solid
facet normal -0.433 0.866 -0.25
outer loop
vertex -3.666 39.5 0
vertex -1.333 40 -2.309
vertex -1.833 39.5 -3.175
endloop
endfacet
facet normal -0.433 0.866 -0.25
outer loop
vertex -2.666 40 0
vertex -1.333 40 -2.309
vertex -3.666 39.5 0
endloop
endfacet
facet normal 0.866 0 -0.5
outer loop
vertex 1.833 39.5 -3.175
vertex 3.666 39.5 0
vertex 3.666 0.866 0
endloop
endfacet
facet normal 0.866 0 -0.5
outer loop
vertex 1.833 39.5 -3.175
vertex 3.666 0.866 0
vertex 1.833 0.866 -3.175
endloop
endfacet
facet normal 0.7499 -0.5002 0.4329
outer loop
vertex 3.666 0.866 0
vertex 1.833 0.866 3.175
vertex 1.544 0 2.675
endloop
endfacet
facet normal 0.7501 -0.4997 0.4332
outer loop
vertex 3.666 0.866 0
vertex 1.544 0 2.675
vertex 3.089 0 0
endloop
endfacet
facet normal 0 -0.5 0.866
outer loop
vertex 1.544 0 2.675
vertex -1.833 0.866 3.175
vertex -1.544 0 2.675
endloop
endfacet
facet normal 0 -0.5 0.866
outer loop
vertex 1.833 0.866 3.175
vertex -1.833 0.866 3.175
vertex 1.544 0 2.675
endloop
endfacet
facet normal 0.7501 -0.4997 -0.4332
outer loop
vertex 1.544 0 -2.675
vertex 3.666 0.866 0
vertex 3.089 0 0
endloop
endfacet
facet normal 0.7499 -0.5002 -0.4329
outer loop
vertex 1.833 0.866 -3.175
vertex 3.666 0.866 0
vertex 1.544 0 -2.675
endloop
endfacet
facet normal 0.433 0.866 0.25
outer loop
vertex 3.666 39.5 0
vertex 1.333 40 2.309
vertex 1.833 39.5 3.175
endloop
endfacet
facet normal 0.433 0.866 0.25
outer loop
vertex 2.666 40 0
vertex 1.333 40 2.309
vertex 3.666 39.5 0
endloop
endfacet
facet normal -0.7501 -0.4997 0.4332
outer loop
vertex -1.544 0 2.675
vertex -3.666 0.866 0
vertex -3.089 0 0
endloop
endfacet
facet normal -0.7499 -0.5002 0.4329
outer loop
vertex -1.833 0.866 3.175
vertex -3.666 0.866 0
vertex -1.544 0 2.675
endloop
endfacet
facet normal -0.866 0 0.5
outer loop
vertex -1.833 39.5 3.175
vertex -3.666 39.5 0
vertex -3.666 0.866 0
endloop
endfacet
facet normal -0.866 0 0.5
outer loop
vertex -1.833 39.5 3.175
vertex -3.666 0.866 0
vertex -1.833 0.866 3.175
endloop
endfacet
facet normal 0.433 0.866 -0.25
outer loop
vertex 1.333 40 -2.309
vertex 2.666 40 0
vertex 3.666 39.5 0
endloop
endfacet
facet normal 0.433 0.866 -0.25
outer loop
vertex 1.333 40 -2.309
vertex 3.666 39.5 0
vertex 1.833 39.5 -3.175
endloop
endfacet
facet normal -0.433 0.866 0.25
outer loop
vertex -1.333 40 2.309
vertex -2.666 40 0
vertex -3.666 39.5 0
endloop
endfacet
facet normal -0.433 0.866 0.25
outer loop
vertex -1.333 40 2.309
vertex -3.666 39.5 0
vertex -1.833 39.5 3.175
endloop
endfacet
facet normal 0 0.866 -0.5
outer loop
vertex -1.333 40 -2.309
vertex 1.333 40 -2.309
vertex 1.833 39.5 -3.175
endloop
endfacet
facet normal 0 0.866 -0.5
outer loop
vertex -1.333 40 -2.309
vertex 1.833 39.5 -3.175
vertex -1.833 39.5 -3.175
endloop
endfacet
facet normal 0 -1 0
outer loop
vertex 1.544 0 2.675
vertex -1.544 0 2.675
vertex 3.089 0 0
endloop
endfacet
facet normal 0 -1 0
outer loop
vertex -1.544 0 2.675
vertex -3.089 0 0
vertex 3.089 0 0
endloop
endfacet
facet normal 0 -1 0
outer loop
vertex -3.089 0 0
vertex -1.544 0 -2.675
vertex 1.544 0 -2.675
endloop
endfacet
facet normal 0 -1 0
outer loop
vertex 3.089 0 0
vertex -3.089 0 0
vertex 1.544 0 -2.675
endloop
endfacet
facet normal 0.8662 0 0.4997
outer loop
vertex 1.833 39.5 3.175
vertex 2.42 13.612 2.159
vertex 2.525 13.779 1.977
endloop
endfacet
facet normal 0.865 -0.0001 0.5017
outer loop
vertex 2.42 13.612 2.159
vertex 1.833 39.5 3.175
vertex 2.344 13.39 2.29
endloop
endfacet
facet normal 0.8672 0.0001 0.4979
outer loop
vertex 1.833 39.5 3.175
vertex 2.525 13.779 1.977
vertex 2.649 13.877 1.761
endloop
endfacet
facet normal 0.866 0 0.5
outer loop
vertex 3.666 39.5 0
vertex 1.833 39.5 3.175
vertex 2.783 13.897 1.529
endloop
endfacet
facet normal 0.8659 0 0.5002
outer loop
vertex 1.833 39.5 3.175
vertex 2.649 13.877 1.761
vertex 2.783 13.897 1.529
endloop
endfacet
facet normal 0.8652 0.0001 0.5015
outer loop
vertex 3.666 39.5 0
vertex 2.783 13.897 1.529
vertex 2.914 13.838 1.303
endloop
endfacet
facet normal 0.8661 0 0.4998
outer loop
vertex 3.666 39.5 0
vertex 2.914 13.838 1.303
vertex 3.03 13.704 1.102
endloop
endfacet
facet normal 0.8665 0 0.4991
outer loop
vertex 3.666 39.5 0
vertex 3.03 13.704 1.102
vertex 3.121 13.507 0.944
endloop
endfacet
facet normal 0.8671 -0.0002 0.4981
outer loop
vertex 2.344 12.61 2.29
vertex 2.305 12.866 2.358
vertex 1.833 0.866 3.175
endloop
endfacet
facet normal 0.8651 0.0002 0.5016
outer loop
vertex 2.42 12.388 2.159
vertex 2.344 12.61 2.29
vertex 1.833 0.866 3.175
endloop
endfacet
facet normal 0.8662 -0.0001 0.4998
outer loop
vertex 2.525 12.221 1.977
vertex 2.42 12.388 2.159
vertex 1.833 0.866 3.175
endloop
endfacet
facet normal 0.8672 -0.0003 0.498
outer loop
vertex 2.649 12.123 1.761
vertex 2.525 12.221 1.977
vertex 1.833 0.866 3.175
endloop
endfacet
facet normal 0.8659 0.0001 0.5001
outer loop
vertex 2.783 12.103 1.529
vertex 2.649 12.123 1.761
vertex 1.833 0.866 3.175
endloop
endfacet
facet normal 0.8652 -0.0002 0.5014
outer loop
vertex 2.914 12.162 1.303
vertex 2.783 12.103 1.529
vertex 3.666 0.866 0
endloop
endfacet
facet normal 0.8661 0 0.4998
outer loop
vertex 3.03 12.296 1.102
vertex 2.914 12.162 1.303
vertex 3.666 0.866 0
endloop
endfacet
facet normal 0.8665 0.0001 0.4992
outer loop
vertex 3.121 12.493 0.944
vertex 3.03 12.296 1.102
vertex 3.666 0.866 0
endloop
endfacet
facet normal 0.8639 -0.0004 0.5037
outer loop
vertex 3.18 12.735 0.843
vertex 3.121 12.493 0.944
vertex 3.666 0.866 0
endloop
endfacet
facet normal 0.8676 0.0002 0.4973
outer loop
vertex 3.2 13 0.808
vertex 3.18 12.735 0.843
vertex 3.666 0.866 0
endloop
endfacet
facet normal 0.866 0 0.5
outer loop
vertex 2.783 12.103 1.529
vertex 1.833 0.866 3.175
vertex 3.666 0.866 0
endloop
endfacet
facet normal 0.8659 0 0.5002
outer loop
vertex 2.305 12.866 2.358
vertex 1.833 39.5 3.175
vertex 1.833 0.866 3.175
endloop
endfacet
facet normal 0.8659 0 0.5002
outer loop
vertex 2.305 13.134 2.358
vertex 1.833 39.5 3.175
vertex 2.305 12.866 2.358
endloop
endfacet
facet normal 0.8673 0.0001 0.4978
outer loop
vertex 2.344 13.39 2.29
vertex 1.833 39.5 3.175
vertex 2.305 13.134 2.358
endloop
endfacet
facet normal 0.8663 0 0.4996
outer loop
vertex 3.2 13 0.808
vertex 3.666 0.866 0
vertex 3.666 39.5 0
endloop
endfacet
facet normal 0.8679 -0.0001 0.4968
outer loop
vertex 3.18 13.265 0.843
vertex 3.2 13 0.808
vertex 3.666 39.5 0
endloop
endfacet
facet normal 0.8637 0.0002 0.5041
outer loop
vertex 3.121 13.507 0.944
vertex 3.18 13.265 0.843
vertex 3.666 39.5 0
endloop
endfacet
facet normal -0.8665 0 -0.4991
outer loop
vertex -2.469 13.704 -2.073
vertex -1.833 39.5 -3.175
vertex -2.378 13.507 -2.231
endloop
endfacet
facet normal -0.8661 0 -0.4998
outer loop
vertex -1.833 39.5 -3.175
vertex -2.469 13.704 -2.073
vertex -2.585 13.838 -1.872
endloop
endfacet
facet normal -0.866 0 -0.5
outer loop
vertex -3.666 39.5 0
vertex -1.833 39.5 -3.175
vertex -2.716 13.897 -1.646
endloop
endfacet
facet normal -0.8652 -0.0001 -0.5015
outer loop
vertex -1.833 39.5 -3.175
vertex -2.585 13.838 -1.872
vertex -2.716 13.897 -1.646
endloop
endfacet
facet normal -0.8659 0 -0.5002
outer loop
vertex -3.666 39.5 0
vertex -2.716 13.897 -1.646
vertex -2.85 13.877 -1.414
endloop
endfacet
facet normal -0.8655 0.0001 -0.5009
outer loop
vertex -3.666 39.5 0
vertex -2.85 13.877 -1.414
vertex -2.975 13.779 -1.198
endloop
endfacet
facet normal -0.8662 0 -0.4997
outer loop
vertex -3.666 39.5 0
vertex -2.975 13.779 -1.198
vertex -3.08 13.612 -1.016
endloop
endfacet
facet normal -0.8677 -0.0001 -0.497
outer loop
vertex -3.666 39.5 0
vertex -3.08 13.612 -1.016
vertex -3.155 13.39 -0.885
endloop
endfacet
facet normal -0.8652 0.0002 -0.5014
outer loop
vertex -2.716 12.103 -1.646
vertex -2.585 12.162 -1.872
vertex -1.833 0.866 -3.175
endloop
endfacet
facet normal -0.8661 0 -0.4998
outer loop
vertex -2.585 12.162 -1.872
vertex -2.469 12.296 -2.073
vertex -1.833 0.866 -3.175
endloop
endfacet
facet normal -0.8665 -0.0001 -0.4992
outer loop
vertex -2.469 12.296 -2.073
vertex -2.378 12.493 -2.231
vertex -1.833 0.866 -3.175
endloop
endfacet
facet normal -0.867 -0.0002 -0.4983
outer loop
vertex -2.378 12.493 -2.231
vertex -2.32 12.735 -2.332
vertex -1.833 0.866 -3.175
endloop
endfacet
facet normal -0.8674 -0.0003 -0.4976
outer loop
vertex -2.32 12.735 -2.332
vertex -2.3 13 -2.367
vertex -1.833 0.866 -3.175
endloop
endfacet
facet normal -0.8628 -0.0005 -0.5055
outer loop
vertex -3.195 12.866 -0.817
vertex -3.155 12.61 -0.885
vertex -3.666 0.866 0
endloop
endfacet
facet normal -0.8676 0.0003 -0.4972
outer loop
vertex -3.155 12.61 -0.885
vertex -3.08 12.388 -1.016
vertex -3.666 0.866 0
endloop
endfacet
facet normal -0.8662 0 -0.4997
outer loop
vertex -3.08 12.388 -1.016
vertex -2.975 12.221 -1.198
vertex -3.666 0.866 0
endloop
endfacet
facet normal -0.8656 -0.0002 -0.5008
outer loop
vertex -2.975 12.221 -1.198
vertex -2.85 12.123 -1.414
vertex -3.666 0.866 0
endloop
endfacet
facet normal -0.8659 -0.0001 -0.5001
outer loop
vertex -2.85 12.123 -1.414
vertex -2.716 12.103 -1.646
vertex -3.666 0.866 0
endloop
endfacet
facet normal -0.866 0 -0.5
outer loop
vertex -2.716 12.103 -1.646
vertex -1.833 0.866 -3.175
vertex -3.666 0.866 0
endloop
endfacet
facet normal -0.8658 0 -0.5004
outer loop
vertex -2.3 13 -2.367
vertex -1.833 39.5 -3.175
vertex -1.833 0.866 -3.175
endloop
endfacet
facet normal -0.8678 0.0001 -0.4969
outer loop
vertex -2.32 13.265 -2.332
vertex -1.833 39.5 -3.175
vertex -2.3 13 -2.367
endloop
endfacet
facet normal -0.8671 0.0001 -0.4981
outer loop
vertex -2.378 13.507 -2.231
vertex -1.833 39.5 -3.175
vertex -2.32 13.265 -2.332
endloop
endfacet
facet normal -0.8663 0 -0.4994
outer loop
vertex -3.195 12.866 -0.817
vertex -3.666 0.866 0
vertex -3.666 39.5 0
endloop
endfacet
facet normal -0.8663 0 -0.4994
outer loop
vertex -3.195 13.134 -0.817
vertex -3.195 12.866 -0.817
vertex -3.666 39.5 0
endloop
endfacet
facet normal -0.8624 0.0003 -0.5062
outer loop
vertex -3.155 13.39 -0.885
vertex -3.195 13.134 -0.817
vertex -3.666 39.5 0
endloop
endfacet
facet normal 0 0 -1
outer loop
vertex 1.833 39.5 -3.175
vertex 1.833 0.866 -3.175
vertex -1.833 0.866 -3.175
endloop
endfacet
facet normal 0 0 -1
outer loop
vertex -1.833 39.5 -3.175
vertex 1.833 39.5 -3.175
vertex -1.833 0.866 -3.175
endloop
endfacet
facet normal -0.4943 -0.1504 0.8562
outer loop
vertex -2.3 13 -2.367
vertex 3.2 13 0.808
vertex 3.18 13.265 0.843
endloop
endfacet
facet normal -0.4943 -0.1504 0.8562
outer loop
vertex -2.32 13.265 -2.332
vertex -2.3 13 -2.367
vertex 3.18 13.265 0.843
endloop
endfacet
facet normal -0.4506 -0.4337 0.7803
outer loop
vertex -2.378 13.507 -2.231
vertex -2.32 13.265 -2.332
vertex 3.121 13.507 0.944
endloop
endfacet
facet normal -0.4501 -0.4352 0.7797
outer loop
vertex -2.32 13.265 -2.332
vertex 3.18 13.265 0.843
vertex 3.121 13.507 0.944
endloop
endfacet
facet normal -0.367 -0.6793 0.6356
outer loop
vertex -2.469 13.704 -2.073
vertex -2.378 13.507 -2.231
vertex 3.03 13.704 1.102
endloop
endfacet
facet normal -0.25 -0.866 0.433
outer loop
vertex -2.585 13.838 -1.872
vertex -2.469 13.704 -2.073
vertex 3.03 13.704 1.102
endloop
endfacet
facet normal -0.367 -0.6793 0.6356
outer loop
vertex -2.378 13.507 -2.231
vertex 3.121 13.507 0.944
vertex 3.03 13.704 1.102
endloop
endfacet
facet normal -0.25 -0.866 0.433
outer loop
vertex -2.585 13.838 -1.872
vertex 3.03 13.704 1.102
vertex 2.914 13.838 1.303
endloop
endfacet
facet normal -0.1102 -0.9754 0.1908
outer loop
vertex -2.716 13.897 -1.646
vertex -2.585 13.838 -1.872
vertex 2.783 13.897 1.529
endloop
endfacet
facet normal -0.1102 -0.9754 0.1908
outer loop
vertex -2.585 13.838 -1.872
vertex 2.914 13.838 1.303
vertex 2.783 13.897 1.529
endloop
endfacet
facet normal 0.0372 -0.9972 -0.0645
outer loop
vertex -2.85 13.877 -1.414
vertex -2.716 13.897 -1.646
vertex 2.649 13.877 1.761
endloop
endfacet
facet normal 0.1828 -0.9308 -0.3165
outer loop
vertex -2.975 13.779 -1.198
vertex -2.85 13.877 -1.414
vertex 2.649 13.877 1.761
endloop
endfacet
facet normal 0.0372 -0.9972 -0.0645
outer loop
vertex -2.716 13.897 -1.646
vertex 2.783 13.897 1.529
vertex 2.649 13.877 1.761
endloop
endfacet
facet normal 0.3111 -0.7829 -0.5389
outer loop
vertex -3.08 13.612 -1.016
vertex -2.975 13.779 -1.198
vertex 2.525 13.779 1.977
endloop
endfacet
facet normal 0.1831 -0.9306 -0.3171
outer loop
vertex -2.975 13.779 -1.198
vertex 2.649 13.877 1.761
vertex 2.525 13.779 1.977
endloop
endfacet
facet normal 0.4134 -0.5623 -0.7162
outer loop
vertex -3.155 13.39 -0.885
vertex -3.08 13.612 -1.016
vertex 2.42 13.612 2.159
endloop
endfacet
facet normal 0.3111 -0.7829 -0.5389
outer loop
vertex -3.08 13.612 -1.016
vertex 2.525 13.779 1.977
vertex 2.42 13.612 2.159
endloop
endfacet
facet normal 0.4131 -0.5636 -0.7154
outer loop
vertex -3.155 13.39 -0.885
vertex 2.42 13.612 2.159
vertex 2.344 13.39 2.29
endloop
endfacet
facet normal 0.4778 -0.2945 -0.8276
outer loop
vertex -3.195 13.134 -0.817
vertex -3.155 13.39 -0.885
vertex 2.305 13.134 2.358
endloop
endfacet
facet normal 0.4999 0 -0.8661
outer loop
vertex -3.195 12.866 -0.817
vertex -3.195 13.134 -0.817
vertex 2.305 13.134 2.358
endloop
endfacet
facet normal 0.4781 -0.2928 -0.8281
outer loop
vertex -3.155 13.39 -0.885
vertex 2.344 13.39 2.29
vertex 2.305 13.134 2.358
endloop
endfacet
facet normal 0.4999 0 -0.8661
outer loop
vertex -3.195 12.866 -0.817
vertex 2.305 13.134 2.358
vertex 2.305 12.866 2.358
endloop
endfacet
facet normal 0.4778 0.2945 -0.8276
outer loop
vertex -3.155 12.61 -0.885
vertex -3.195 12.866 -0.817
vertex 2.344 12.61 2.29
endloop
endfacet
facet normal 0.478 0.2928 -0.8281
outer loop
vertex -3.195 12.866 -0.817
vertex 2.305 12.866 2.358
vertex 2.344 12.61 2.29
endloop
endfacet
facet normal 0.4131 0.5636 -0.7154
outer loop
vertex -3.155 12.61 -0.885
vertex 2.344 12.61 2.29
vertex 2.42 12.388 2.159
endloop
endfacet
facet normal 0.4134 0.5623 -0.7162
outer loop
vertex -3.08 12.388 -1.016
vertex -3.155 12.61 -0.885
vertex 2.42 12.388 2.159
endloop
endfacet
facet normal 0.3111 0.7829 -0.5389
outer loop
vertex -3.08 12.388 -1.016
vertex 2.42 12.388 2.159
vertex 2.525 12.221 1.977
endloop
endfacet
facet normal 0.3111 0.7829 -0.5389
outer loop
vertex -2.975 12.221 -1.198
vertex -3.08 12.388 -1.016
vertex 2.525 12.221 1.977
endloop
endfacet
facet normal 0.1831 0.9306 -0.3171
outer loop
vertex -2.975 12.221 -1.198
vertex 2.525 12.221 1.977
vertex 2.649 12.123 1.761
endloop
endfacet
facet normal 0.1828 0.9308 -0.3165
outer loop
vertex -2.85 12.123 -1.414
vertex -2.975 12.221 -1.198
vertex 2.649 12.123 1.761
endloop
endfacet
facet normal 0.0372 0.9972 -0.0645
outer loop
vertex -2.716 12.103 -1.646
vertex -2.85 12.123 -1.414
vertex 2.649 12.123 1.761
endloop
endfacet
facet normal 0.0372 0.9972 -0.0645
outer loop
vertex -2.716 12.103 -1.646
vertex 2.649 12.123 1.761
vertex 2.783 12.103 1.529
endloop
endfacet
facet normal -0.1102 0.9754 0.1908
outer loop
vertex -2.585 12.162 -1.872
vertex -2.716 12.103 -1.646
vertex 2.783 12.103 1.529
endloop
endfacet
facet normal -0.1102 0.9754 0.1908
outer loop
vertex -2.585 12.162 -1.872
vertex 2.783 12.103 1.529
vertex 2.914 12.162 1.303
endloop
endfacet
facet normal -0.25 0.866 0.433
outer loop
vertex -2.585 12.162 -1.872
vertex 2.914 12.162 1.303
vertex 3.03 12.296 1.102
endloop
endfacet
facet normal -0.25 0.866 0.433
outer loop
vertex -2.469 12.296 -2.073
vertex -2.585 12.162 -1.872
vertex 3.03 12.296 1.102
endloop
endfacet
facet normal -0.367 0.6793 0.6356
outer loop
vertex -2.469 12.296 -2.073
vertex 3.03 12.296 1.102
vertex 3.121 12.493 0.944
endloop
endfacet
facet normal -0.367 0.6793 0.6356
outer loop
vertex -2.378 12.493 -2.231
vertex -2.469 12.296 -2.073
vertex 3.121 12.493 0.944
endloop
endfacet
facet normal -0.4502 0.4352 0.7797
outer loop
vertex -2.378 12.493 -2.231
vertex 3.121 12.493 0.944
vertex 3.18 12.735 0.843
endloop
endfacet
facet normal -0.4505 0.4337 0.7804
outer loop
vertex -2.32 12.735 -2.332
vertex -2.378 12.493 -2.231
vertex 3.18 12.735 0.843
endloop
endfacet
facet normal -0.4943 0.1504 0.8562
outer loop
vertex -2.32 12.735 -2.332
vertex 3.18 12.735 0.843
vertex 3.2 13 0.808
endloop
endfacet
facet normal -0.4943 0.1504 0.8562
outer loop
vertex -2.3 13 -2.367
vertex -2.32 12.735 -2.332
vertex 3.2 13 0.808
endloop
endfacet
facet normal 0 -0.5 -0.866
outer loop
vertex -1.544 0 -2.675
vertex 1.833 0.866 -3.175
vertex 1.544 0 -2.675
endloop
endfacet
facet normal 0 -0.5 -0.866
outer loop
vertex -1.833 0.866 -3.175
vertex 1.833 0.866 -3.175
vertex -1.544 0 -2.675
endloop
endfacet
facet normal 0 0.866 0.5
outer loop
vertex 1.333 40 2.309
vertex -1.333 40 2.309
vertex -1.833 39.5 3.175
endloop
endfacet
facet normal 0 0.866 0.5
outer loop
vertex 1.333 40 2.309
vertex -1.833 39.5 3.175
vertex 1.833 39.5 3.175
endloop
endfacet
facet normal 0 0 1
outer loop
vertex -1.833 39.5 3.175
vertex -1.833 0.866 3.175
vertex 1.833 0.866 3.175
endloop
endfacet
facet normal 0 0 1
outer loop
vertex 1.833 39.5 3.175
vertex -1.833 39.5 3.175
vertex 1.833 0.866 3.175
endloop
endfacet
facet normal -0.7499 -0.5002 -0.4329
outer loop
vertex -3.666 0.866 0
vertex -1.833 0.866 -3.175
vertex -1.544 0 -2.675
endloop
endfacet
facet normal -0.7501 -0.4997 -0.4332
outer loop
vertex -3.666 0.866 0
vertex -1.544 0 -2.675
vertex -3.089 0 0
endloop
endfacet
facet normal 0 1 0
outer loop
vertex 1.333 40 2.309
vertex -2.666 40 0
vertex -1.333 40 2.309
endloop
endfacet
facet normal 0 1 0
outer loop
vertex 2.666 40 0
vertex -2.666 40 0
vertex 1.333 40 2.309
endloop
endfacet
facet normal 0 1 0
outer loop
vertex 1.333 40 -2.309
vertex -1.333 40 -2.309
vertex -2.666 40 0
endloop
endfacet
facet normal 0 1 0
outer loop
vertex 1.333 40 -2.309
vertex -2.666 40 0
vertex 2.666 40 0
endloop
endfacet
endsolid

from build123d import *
from OCP.BRepFilletAPI import BRepFilletAPI_MakeChamfer

# Parameters (mm, degrees)
P_IDAT_VYSUNUT_M1_DEPTH  = 40
ZKOSEN_1_SIZE            = 0.5
ZKOSEN_1_SIZE2           = 0.866025404
SKICA2_R                 = 0.9
ODEBRAT_VYSUNUT_M1_DEPTH = 41.790243421


with BuildPart() as part:
    # Skica1 → Přidat vysunutím1 (new body)
    with BuildSketch(Plane(origin=(0, 0, 0), x_dir=(1, 0, 0), z_dir=(0, 1, 0))):
        Polygon((3.666174209, 0), (1.833087105, 3.175), (-1.833087105, 3.175), (-3.666174209, 0), (-1.833087105, -3.175), (1.833087105, -3.175), align=None)
    extrude(amount=P_IDAT_VYSUNUT_M1_DEPTH)

    # Zkosení1: one chamfer whose edges measure the first distance from different faces: ONE call of the kernel's chamfer builder (chamfer() names one face for all edges)
    zkosen_1_edges_1 = [part.edges().sort_by_distance(p)[0] for p in [
        (0, 40, -3.175),
    ]]
    zkosen_1_side_1 = [part.faces().sort_by_distance(p)[0] for p in [
        (0, 20, -3.175),
    ]]
    zkosen_1_edges_2 = [part.edges().sort_by_distance(p)[0] for p in [
        (-2.749630657, 40, -1.5875),
    ]]
    zkosen_1_side_2 = [part.faces().sort_by_distance(p)[0] for p in [
        (-2.749630657, 20, -1.5875),
    ]]
    zkosen_1_edges_3 = [part.edges().sort_by_distance(p)[0] for p in [
        (-2.749630657, 40, 1.5875),
    ]]
    zkosen_1_side_3 = [part.faces().sort_by_distance(p)[0] for p in [
        (-2.749630657, 20, 1.5875),
    ]]
    zkosen_1_edges_4 = [part.edges().sort_by_distance(p)[0] for p in [
        (0, 40, 3.175),
    ]]
    zkosen_1_side_4 = [part.faces().sort_by_distance(p)[0] for p in [
        (0, 20, 3.175),
    ]]
    zkosen_1_edges_5 = [part.edges().sort_by_distance(p)[0] for p in [
        (2.749630657, 40, 1.5875),
    ]]
    zkosen_1_side_5 = [part.faces().sort_by_distance(p)[0] for p in [
        (2.749630657, 20, 1.5875),
    ]]
    zkosen_1_edges_6 = [part.edges().sort_by_distance(p)[0] for p in [
        (0, 0, 3.175),
        (-2.749630657, 0, 1.5875),
        (-2.749630657, 0, -1.5875),
        (0, 0, -3.175),
        (2.749630657, 0, -1.5875),
        (2.749630657, 0, 1.5875),
    ]]
    zkosen_1_side_6 = [part.faces().sort_by_distance(p)[0] for p in [
        (0, 0, 0),
    ]]
    zkosen_1_edges_7 = [part.edges().sort_by_distance(p)[0] for p in [
        (2.749630657, 40, -1.5875),
    ]]
    zkosen_1_side_7 = [part.faces().sort_by_distance(p)[0] for p in [
        (2.749630657, 20, -1.5875),
    ]]
    zkosen_1 = BRepFilletAPI_MakeChamfer(part.part.solid().wrapped)
    for e in zkosen_1_edges_1:
        zkosen_1.Add(ZKOSEN_1_SIZE, ZKOSEN_1_SIZE2, e.wrapped, zkosen_1_side_1[0].wrapped)  # the first distance lies on this face
    for e in zkosen_1_edges_2:
        zkosen_1.Add(ZKOSEN_1_SIZE, ZKOSEN_1_SIZE2, e.wrapped, zkosen_1_side_2[0].wrapped)  # the first distance lies on this face
    for e in zkosen_1_edges_3:
        zkosen_1.Add(ZKOSEN_1_SIZE, ZKOSEN_1_SIZE2, e.wrapped, zkosen_1_side_3[0].wrapped)  # the first distance lies on this face
    for e in zkosen_1_edges_4:
        zkosen_1.Add(ZKOSEN_1_SIZE, ZKOSEN_1_SIZE2, e.wrapped, zkosen_1_side_4[0].wrapped)  # the first distance lies on this face
    for e in zkosen_1_edges_5:
        zkosen_1.Add(ZKOSEN_1_SIZE, ZKOSEN_1_SIZE2, e.wrapped, zkosen_1_side_5[0].wrapped)  # the first distance lies on this face
    for e in zkosen_1_edges_6:
        zkosen_1.Add(ZKOSEN_1_SIZE, ZKOSEN_1_SIZE2, e.wrapped, zkosen_1_side_6[0].wrapped)  # the first distance lies on this face
    for e in zkosen_1_edges_7:
        zkosen_1.Add(ZKOSEN_1_SIZE, ZKOSEN_1_SIZE2, e.wrapped, zkosen_1_side_7[0].wrapped)  # the first distance lies on this face
    add(Compound.cast(zkosen_1.Shape()), mode=Mode.REPLACE)

    # Skica2 → Odebrat vysunutím1 (cut, through all)
    with BuildSketch(Plane(origin=(2.749630657, 0, 1.5875), x_dir=(0.49999999999999517, 0, -0.8660254037844415), z_dir=(0.8660254037844414, 0, 0.4999999999999951))):
        with Locations((0, 13)):
            Circle(SKICA2_R)
    extrude(amount=-ODEBRAT_VYSUNUT_M1_DEPTH, mode=Mode.SUBTRACT)


solid = part.part
